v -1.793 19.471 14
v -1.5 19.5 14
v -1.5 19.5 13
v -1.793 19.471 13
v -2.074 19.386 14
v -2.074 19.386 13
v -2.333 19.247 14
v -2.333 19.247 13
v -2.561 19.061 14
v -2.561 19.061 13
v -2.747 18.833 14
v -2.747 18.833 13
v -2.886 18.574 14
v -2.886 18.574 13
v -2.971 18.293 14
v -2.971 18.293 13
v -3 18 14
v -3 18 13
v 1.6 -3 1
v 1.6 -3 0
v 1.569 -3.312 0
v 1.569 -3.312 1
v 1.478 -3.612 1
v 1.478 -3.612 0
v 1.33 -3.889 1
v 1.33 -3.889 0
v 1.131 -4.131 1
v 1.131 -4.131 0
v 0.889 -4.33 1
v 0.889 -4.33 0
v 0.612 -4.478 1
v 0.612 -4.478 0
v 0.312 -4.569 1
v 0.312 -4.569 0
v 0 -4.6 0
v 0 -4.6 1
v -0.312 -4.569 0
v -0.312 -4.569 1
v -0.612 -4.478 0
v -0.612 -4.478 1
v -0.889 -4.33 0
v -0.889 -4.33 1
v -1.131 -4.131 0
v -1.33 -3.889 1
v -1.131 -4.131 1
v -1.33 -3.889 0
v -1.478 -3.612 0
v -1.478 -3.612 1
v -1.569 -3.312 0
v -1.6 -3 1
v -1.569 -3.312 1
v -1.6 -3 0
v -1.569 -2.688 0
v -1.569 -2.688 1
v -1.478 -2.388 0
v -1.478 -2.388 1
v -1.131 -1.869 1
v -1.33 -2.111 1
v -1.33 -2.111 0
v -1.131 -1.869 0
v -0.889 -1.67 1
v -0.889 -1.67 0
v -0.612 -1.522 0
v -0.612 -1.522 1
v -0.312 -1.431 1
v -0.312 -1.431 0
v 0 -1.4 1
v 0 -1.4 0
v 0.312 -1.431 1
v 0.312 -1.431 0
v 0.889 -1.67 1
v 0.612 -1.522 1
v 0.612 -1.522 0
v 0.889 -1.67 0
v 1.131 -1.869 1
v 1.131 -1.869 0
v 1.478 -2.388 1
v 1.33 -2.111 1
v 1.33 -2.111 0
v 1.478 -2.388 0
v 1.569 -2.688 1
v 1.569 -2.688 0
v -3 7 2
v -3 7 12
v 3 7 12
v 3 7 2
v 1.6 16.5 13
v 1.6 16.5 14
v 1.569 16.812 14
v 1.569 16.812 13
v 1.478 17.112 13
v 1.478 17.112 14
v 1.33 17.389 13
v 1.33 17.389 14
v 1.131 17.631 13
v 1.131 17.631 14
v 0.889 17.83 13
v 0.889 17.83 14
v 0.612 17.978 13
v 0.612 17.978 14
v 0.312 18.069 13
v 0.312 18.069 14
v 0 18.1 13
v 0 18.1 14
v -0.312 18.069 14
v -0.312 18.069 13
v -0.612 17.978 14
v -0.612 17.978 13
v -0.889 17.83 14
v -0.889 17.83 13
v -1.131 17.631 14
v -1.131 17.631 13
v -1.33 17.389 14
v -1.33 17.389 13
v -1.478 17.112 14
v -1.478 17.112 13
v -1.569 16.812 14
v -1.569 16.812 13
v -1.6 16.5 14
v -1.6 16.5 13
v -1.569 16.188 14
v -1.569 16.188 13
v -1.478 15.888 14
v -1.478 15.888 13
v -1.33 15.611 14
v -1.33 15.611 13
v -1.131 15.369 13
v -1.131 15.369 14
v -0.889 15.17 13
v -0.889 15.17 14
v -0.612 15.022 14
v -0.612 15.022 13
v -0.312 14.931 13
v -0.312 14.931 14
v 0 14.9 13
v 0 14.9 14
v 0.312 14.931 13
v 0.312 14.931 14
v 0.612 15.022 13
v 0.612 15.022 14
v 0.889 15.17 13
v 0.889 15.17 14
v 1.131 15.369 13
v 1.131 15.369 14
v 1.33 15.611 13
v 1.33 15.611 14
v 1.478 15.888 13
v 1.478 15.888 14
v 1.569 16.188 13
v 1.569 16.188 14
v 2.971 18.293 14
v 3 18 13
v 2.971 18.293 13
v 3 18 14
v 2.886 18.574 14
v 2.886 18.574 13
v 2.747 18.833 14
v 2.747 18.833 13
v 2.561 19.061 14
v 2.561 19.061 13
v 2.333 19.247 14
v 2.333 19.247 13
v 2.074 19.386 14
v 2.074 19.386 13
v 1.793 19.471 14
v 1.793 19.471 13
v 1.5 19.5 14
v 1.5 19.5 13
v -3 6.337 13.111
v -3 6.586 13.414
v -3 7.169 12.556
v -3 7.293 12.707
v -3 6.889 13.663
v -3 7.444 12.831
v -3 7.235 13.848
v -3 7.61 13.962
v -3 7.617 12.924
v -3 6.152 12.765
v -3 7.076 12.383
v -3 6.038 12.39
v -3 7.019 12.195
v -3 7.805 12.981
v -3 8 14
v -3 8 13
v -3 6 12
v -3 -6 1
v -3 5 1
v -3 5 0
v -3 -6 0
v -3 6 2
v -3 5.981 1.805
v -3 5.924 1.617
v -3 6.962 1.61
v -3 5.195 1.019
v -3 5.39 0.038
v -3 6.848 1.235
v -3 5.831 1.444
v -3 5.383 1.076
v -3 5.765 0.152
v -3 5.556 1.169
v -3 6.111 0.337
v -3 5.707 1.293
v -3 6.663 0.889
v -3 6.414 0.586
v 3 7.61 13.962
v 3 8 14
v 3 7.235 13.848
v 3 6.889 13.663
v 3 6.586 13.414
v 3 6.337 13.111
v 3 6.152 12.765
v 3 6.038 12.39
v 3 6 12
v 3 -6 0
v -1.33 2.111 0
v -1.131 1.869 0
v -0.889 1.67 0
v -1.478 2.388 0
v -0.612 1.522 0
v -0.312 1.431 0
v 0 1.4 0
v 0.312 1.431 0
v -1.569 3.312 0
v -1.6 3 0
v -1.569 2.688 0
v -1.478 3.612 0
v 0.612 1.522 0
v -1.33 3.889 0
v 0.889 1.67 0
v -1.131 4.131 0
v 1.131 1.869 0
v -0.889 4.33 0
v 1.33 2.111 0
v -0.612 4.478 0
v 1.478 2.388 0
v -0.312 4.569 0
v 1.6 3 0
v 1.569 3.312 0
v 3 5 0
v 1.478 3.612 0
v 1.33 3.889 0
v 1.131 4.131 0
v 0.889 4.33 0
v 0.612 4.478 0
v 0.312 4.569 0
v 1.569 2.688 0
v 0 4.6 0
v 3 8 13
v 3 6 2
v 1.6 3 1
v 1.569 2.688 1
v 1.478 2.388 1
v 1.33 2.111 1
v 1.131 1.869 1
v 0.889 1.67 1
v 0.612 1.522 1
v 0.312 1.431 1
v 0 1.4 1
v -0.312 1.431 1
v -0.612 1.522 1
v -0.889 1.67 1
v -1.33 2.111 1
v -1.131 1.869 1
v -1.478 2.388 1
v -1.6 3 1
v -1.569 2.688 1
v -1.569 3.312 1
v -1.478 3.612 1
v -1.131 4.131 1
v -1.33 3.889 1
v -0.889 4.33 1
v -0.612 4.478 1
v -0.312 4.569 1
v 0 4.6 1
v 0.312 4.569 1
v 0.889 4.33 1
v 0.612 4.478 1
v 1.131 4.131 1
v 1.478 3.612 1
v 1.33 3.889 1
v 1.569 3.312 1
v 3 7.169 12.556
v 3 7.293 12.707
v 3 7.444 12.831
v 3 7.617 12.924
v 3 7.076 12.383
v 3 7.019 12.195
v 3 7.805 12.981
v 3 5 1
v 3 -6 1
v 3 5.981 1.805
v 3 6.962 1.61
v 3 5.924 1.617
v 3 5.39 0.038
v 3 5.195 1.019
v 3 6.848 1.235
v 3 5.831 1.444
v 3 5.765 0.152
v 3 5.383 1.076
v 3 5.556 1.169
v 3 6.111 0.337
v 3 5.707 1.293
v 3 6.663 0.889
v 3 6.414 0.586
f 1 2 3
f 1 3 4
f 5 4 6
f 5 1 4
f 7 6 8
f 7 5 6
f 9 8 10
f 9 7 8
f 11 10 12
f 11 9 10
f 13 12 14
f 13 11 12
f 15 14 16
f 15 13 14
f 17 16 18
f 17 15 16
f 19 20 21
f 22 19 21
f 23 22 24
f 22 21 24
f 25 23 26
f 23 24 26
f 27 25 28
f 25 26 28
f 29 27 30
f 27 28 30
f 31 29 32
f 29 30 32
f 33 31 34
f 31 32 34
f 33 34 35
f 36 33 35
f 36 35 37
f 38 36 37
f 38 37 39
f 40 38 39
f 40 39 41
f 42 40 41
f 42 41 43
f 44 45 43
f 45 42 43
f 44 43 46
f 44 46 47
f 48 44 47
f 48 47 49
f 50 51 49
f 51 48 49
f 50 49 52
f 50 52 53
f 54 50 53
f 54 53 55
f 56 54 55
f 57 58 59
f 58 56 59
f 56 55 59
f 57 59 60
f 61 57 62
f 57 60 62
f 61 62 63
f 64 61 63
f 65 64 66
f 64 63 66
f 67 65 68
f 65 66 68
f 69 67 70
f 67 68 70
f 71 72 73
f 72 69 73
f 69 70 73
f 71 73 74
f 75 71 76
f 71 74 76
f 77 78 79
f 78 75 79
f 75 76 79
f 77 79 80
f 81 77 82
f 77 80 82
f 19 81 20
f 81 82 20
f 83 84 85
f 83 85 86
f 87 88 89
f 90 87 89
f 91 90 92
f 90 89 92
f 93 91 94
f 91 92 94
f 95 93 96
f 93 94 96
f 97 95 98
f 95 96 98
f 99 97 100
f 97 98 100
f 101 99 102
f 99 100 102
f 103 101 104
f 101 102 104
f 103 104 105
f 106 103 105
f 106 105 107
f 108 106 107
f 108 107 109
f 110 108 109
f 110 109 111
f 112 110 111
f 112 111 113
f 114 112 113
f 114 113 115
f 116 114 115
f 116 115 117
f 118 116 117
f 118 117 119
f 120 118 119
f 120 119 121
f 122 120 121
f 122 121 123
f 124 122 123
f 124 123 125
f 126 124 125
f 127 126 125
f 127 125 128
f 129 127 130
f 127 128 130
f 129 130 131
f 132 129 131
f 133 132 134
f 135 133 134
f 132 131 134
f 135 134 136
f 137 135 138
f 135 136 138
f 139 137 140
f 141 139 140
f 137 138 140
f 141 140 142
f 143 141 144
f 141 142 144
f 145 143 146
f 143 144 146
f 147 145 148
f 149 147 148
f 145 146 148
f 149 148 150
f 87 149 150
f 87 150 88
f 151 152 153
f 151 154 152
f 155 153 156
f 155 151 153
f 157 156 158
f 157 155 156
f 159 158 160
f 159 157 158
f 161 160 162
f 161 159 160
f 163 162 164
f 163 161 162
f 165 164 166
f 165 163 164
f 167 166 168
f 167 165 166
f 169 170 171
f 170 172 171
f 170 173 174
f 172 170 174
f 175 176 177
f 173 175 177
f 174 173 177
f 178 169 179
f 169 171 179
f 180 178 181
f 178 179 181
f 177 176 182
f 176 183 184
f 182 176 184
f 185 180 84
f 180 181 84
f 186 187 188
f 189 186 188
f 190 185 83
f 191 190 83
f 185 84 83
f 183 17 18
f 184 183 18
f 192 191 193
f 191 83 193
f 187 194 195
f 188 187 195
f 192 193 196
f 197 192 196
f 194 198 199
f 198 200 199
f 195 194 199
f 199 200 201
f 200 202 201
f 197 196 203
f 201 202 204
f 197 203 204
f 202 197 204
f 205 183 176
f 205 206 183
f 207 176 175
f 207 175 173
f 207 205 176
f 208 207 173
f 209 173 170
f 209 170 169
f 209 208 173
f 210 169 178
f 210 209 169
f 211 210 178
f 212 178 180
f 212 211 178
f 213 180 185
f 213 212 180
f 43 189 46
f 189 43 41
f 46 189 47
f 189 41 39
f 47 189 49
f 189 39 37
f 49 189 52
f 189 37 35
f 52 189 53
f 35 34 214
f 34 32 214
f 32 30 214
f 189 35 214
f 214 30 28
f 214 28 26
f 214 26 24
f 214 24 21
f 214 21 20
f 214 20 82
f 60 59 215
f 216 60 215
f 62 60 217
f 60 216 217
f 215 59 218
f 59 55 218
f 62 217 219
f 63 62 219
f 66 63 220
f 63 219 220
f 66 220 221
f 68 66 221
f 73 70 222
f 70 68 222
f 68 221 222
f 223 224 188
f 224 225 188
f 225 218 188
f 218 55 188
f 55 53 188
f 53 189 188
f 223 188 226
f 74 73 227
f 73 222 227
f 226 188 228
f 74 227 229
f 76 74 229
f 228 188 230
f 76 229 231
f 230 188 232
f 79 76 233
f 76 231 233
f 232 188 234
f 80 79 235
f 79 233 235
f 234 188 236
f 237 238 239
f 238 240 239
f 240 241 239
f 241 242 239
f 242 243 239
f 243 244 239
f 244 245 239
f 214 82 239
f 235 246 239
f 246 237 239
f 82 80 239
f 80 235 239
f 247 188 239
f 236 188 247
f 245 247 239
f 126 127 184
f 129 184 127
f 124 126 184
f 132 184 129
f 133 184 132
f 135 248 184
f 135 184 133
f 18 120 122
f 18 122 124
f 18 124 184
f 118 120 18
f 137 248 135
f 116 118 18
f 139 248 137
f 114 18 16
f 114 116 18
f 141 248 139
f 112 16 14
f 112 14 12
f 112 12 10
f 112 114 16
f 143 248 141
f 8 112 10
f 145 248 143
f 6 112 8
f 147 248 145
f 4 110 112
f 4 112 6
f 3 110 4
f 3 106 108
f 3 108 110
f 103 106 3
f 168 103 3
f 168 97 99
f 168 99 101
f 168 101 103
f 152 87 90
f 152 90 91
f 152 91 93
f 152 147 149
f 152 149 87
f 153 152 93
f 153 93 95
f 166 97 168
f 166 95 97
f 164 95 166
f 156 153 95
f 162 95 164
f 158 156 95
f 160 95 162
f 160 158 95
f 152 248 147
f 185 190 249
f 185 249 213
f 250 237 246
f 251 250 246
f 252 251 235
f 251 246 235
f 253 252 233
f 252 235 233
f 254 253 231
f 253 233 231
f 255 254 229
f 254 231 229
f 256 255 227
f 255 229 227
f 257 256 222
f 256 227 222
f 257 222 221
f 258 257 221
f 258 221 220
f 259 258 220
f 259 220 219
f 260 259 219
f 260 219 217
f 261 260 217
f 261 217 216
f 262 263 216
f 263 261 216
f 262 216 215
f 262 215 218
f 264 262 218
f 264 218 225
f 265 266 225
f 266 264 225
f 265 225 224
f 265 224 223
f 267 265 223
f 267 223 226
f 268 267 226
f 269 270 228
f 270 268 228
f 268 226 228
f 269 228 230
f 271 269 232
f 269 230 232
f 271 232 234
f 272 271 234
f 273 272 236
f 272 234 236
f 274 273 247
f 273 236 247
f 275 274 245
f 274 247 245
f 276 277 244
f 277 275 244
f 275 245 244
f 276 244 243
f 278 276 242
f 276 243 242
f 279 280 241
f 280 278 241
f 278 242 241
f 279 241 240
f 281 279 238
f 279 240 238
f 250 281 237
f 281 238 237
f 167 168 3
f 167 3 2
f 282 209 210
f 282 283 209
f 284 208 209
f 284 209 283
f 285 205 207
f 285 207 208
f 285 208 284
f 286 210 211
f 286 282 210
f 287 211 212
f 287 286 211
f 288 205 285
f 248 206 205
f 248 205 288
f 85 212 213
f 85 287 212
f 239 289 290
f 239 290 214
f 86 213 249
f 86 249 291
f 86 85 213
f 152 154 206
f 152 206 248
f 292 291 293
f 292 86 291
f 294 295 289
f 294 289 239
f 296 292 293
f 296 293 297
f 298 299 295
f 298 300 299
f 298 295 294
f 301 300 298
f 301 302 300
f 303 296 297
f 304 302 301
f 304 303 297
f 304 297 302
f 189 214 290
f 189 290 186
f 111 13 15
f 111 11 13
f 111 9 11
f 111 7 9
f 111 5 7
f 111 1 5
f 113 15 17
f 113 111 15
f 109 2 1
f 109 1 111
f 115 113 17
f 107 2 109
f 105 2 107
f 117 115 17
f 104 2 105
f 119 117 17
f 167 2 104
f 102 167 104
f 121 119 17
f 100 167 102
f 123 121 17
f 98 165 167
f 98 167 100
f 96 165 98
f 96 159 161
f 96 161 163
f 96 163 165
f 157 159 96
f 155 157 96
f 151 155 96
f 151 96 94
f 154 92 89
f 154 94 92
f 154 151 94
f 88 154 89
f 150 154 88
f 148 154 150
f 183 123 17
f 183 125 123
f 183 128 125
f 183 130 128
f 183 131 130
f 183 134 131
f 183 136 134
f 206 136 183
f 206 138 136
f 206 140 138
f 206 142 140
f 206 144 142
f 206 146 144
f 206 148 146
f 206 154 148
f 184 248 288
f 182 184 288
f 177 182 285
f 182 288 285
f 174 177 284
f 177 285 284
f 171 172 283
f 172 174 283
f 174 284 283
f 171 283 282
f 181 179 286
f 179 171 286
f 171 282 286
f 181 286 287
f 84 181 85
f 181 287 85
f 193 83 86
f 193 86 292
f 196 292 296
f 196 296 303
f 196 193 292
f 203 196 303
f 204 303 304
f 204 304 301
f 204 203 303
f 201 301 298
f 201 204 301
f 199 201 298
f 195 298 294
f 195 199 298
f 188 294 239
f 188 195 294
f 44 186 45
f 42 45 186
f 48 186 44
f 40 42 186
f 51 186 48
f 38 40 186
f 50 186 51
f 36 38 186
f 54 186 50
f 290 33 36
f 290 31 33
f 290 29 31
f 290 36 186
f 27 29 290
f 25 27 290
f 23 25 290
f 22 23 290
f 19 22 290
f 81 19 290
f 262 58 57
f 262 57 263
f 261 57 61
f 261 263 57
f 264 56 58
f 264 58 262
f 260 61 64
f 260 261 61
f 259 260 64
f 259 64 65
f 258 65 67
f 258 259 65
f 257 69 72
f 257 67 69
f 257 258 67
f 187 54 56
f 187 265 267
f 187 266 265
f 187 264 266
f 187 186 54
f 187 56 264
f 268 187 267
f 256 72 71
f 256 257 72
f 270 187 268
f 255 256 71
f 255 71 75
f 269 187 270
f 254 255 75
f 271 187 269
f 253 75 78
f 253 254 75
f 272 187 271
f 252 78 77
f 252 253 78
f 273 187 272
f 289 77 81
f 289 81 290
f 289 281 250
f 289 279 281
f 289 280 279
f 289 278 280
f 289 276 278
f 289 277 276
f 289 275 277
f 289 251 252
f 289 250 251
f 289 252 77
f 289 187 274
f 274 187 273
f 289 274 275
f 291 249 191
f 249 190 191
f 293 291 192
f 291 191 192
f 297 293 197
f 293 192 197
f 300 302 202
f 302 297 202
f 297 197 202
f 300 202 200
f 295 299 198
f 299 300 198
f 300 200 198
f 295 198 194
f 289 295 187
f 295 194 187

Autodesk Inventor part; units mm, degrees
ref_plane "YZ Plane" through (0, 0, 0) normal (1, 0, 0) x (0, 1, 0)
ref_plane "XZ Plane" through (0, 0, 0) normal (0, 1, 0) x (-1, 0, 0)
ref_plane "XY Plane" through (0, 0, 0) normal (0, 0, 1) x (1, 0, 0)
sketch "Sketch5" plane through (-3, 6, 14) normal (0, -1, 0) x (1, 0, 0)
  circle A0 centre (3, -8) radius 1.6
  circle A1 centre (3, -3) radius 1.6
  line L0 (6, 0) -> (0, 0) projected
  point P0 (3, -14)
  point P1 (3, 0)
  dimension "d33" = 3.2
  dimension "d34" = 3.2
  dimension "d35" = 5
  dimension "d36" = 3
sketch "Sketch1" plane through (0, 0, 0) normal (0, 0, 1) x (1, 0, 0)
  line L0 (-3, 6) -> (3, 6)
  line L1 (3, 6) -> (3, -6)
  line L2 (3, -6) -> (-3, -6)
  line L3 (-3, -6) -> (-3, 6)
  line L4 (-3, 6) -> (3, -6) construction
  line L5 (3, 6) -> (-3, -6) construction
  circle A0 centre (0, 3) radius 1.6
  circle A1 centre (0, -3) radius 1.6
  point P0 (0, 0)
  dimension "d0" = 12
  dimension "d1" = 6
  dimension "d2" = 3.2
  dimension "d3" = 3.2
  dimension "d4" = 6
  dimension "d5" = 3
extrude "Plate1" add sketch "Sketch1" along normal blind 1
sketch "Sketch2" plane through (-3, 6, 1) normal (0, 1, 0) x (-1, 0, 0)
  line L0 (-6, 0) -> (0, 0)
  line L1 (0, 0) -> (0, 13)
  line L2 (0, 13) -> (-6, 13)
  line L3 (-6, 13) -> (-6, 0)
edge flange "Flange1" height 14 angle 90 thickness 1 bend radius 1 thickness toward (0, 1, 0) relief tear relief width 1 relief depth 0.5 edges at (0, 6, 1) wall of the first edge with corners at (3, 6, 1) (-3, 6, 1) (-3, 6, 14) (3, 6, 14)
bend "Bend1"
corner "Corner1"
sketch "Sketch6" plane through (3, 6, 13) normal (0, 0, 1) x (1, 0, 0)
  line L0 (-6, 0) -> (0, 0)
  line L1 (0, 0) -> (0, 13.5)
  line L2 (0, 13.5) -> (-6, 13.5)
  line L3 (-6, 13.5) -> (-6, 0)
edge flange "Flange3" height 13.5 angle 90 thickness 1 bend radius 1 thickness toward (0, 0, 1) relief tear relief width 1 relief depth 0.5 edges at (0, 7, 14) wall of the first edge with corners at (-3, 6, 13) (3, 6, 13) (3, 19.5, 13) (-3, 19.5, 13)
bend "Bend3"
corner "Corner3"
fillet "Corner Round1" radius 1.5 2 edges at (3, 19.5, 13.5) (-3, 19.5, 13.5)
sketch "Sketch7" plane through (-3, 8, 14) normal (0, 0, 1) x (1, 0, 0)
  circle A0 centre (3, 8.5) radius 1.6
  line L0 (0, 0) -> (6, 0) projected
  line L1 (1.5, 11.5) -> (4.5, 11.5) projected
  point P0 (3, -8)
  point P1 (3, 0)
  dimension "d50" = 3.2
  dimension "d51" = 3
extrude "Cut3" cut sketch "Sketch7" against normal blind 1
equation "\"d52\" = 厚度"
equation "\"d6\" = 厚度"
equation "\"d7\" = 折彎離隙寬度"
equation "\"d8\" = 折彎離隙深度"
equation "\"d9\" = 最小剩餘"
equation "\"d10\" = 轉移半徑"
equation "\"d13\" = 折彎半徑"
equation "\"d14\" = 轉角離隙大小"
equation "\"d15\" = 間隙大小"
equation "\"d16\" = Jacobi半徑大小"
equation "\"d39\" = 折彎離隙寬度"
equation "\"d40\" = 折彎離隙深度"
equation "\"d41\" = 最小剩餘"
equation "\"d42\" = 轉移半徑"
equation "\"d45\" = 折彎半徑"
equation "\"d46\" = 轉角離隙大小"
equation "\"d47\" = 間隙大小"
equation "\"d48\" = Jacobi半徑大小"
equation "\"折彎半徑\" = 厚度"
equation "\"折彎離隙寬度\" = 厚度"
equation "\"折彎離隙深度\" = 0.5 * 厚度"
equation "\"轉角離隙大小\" = 4 * 厚度"
equation "\"最小剩餘\" = 2 * 厚度"
equation "\"轉移半徑\" = 折彎半徑"
equation "\"Jacobi半徑大小\" = 折彎半徑"
equation "\"間隙大小\" = 厚度"
equation "\"厚度\" = 1"
properties part number "connector_Zshape"
